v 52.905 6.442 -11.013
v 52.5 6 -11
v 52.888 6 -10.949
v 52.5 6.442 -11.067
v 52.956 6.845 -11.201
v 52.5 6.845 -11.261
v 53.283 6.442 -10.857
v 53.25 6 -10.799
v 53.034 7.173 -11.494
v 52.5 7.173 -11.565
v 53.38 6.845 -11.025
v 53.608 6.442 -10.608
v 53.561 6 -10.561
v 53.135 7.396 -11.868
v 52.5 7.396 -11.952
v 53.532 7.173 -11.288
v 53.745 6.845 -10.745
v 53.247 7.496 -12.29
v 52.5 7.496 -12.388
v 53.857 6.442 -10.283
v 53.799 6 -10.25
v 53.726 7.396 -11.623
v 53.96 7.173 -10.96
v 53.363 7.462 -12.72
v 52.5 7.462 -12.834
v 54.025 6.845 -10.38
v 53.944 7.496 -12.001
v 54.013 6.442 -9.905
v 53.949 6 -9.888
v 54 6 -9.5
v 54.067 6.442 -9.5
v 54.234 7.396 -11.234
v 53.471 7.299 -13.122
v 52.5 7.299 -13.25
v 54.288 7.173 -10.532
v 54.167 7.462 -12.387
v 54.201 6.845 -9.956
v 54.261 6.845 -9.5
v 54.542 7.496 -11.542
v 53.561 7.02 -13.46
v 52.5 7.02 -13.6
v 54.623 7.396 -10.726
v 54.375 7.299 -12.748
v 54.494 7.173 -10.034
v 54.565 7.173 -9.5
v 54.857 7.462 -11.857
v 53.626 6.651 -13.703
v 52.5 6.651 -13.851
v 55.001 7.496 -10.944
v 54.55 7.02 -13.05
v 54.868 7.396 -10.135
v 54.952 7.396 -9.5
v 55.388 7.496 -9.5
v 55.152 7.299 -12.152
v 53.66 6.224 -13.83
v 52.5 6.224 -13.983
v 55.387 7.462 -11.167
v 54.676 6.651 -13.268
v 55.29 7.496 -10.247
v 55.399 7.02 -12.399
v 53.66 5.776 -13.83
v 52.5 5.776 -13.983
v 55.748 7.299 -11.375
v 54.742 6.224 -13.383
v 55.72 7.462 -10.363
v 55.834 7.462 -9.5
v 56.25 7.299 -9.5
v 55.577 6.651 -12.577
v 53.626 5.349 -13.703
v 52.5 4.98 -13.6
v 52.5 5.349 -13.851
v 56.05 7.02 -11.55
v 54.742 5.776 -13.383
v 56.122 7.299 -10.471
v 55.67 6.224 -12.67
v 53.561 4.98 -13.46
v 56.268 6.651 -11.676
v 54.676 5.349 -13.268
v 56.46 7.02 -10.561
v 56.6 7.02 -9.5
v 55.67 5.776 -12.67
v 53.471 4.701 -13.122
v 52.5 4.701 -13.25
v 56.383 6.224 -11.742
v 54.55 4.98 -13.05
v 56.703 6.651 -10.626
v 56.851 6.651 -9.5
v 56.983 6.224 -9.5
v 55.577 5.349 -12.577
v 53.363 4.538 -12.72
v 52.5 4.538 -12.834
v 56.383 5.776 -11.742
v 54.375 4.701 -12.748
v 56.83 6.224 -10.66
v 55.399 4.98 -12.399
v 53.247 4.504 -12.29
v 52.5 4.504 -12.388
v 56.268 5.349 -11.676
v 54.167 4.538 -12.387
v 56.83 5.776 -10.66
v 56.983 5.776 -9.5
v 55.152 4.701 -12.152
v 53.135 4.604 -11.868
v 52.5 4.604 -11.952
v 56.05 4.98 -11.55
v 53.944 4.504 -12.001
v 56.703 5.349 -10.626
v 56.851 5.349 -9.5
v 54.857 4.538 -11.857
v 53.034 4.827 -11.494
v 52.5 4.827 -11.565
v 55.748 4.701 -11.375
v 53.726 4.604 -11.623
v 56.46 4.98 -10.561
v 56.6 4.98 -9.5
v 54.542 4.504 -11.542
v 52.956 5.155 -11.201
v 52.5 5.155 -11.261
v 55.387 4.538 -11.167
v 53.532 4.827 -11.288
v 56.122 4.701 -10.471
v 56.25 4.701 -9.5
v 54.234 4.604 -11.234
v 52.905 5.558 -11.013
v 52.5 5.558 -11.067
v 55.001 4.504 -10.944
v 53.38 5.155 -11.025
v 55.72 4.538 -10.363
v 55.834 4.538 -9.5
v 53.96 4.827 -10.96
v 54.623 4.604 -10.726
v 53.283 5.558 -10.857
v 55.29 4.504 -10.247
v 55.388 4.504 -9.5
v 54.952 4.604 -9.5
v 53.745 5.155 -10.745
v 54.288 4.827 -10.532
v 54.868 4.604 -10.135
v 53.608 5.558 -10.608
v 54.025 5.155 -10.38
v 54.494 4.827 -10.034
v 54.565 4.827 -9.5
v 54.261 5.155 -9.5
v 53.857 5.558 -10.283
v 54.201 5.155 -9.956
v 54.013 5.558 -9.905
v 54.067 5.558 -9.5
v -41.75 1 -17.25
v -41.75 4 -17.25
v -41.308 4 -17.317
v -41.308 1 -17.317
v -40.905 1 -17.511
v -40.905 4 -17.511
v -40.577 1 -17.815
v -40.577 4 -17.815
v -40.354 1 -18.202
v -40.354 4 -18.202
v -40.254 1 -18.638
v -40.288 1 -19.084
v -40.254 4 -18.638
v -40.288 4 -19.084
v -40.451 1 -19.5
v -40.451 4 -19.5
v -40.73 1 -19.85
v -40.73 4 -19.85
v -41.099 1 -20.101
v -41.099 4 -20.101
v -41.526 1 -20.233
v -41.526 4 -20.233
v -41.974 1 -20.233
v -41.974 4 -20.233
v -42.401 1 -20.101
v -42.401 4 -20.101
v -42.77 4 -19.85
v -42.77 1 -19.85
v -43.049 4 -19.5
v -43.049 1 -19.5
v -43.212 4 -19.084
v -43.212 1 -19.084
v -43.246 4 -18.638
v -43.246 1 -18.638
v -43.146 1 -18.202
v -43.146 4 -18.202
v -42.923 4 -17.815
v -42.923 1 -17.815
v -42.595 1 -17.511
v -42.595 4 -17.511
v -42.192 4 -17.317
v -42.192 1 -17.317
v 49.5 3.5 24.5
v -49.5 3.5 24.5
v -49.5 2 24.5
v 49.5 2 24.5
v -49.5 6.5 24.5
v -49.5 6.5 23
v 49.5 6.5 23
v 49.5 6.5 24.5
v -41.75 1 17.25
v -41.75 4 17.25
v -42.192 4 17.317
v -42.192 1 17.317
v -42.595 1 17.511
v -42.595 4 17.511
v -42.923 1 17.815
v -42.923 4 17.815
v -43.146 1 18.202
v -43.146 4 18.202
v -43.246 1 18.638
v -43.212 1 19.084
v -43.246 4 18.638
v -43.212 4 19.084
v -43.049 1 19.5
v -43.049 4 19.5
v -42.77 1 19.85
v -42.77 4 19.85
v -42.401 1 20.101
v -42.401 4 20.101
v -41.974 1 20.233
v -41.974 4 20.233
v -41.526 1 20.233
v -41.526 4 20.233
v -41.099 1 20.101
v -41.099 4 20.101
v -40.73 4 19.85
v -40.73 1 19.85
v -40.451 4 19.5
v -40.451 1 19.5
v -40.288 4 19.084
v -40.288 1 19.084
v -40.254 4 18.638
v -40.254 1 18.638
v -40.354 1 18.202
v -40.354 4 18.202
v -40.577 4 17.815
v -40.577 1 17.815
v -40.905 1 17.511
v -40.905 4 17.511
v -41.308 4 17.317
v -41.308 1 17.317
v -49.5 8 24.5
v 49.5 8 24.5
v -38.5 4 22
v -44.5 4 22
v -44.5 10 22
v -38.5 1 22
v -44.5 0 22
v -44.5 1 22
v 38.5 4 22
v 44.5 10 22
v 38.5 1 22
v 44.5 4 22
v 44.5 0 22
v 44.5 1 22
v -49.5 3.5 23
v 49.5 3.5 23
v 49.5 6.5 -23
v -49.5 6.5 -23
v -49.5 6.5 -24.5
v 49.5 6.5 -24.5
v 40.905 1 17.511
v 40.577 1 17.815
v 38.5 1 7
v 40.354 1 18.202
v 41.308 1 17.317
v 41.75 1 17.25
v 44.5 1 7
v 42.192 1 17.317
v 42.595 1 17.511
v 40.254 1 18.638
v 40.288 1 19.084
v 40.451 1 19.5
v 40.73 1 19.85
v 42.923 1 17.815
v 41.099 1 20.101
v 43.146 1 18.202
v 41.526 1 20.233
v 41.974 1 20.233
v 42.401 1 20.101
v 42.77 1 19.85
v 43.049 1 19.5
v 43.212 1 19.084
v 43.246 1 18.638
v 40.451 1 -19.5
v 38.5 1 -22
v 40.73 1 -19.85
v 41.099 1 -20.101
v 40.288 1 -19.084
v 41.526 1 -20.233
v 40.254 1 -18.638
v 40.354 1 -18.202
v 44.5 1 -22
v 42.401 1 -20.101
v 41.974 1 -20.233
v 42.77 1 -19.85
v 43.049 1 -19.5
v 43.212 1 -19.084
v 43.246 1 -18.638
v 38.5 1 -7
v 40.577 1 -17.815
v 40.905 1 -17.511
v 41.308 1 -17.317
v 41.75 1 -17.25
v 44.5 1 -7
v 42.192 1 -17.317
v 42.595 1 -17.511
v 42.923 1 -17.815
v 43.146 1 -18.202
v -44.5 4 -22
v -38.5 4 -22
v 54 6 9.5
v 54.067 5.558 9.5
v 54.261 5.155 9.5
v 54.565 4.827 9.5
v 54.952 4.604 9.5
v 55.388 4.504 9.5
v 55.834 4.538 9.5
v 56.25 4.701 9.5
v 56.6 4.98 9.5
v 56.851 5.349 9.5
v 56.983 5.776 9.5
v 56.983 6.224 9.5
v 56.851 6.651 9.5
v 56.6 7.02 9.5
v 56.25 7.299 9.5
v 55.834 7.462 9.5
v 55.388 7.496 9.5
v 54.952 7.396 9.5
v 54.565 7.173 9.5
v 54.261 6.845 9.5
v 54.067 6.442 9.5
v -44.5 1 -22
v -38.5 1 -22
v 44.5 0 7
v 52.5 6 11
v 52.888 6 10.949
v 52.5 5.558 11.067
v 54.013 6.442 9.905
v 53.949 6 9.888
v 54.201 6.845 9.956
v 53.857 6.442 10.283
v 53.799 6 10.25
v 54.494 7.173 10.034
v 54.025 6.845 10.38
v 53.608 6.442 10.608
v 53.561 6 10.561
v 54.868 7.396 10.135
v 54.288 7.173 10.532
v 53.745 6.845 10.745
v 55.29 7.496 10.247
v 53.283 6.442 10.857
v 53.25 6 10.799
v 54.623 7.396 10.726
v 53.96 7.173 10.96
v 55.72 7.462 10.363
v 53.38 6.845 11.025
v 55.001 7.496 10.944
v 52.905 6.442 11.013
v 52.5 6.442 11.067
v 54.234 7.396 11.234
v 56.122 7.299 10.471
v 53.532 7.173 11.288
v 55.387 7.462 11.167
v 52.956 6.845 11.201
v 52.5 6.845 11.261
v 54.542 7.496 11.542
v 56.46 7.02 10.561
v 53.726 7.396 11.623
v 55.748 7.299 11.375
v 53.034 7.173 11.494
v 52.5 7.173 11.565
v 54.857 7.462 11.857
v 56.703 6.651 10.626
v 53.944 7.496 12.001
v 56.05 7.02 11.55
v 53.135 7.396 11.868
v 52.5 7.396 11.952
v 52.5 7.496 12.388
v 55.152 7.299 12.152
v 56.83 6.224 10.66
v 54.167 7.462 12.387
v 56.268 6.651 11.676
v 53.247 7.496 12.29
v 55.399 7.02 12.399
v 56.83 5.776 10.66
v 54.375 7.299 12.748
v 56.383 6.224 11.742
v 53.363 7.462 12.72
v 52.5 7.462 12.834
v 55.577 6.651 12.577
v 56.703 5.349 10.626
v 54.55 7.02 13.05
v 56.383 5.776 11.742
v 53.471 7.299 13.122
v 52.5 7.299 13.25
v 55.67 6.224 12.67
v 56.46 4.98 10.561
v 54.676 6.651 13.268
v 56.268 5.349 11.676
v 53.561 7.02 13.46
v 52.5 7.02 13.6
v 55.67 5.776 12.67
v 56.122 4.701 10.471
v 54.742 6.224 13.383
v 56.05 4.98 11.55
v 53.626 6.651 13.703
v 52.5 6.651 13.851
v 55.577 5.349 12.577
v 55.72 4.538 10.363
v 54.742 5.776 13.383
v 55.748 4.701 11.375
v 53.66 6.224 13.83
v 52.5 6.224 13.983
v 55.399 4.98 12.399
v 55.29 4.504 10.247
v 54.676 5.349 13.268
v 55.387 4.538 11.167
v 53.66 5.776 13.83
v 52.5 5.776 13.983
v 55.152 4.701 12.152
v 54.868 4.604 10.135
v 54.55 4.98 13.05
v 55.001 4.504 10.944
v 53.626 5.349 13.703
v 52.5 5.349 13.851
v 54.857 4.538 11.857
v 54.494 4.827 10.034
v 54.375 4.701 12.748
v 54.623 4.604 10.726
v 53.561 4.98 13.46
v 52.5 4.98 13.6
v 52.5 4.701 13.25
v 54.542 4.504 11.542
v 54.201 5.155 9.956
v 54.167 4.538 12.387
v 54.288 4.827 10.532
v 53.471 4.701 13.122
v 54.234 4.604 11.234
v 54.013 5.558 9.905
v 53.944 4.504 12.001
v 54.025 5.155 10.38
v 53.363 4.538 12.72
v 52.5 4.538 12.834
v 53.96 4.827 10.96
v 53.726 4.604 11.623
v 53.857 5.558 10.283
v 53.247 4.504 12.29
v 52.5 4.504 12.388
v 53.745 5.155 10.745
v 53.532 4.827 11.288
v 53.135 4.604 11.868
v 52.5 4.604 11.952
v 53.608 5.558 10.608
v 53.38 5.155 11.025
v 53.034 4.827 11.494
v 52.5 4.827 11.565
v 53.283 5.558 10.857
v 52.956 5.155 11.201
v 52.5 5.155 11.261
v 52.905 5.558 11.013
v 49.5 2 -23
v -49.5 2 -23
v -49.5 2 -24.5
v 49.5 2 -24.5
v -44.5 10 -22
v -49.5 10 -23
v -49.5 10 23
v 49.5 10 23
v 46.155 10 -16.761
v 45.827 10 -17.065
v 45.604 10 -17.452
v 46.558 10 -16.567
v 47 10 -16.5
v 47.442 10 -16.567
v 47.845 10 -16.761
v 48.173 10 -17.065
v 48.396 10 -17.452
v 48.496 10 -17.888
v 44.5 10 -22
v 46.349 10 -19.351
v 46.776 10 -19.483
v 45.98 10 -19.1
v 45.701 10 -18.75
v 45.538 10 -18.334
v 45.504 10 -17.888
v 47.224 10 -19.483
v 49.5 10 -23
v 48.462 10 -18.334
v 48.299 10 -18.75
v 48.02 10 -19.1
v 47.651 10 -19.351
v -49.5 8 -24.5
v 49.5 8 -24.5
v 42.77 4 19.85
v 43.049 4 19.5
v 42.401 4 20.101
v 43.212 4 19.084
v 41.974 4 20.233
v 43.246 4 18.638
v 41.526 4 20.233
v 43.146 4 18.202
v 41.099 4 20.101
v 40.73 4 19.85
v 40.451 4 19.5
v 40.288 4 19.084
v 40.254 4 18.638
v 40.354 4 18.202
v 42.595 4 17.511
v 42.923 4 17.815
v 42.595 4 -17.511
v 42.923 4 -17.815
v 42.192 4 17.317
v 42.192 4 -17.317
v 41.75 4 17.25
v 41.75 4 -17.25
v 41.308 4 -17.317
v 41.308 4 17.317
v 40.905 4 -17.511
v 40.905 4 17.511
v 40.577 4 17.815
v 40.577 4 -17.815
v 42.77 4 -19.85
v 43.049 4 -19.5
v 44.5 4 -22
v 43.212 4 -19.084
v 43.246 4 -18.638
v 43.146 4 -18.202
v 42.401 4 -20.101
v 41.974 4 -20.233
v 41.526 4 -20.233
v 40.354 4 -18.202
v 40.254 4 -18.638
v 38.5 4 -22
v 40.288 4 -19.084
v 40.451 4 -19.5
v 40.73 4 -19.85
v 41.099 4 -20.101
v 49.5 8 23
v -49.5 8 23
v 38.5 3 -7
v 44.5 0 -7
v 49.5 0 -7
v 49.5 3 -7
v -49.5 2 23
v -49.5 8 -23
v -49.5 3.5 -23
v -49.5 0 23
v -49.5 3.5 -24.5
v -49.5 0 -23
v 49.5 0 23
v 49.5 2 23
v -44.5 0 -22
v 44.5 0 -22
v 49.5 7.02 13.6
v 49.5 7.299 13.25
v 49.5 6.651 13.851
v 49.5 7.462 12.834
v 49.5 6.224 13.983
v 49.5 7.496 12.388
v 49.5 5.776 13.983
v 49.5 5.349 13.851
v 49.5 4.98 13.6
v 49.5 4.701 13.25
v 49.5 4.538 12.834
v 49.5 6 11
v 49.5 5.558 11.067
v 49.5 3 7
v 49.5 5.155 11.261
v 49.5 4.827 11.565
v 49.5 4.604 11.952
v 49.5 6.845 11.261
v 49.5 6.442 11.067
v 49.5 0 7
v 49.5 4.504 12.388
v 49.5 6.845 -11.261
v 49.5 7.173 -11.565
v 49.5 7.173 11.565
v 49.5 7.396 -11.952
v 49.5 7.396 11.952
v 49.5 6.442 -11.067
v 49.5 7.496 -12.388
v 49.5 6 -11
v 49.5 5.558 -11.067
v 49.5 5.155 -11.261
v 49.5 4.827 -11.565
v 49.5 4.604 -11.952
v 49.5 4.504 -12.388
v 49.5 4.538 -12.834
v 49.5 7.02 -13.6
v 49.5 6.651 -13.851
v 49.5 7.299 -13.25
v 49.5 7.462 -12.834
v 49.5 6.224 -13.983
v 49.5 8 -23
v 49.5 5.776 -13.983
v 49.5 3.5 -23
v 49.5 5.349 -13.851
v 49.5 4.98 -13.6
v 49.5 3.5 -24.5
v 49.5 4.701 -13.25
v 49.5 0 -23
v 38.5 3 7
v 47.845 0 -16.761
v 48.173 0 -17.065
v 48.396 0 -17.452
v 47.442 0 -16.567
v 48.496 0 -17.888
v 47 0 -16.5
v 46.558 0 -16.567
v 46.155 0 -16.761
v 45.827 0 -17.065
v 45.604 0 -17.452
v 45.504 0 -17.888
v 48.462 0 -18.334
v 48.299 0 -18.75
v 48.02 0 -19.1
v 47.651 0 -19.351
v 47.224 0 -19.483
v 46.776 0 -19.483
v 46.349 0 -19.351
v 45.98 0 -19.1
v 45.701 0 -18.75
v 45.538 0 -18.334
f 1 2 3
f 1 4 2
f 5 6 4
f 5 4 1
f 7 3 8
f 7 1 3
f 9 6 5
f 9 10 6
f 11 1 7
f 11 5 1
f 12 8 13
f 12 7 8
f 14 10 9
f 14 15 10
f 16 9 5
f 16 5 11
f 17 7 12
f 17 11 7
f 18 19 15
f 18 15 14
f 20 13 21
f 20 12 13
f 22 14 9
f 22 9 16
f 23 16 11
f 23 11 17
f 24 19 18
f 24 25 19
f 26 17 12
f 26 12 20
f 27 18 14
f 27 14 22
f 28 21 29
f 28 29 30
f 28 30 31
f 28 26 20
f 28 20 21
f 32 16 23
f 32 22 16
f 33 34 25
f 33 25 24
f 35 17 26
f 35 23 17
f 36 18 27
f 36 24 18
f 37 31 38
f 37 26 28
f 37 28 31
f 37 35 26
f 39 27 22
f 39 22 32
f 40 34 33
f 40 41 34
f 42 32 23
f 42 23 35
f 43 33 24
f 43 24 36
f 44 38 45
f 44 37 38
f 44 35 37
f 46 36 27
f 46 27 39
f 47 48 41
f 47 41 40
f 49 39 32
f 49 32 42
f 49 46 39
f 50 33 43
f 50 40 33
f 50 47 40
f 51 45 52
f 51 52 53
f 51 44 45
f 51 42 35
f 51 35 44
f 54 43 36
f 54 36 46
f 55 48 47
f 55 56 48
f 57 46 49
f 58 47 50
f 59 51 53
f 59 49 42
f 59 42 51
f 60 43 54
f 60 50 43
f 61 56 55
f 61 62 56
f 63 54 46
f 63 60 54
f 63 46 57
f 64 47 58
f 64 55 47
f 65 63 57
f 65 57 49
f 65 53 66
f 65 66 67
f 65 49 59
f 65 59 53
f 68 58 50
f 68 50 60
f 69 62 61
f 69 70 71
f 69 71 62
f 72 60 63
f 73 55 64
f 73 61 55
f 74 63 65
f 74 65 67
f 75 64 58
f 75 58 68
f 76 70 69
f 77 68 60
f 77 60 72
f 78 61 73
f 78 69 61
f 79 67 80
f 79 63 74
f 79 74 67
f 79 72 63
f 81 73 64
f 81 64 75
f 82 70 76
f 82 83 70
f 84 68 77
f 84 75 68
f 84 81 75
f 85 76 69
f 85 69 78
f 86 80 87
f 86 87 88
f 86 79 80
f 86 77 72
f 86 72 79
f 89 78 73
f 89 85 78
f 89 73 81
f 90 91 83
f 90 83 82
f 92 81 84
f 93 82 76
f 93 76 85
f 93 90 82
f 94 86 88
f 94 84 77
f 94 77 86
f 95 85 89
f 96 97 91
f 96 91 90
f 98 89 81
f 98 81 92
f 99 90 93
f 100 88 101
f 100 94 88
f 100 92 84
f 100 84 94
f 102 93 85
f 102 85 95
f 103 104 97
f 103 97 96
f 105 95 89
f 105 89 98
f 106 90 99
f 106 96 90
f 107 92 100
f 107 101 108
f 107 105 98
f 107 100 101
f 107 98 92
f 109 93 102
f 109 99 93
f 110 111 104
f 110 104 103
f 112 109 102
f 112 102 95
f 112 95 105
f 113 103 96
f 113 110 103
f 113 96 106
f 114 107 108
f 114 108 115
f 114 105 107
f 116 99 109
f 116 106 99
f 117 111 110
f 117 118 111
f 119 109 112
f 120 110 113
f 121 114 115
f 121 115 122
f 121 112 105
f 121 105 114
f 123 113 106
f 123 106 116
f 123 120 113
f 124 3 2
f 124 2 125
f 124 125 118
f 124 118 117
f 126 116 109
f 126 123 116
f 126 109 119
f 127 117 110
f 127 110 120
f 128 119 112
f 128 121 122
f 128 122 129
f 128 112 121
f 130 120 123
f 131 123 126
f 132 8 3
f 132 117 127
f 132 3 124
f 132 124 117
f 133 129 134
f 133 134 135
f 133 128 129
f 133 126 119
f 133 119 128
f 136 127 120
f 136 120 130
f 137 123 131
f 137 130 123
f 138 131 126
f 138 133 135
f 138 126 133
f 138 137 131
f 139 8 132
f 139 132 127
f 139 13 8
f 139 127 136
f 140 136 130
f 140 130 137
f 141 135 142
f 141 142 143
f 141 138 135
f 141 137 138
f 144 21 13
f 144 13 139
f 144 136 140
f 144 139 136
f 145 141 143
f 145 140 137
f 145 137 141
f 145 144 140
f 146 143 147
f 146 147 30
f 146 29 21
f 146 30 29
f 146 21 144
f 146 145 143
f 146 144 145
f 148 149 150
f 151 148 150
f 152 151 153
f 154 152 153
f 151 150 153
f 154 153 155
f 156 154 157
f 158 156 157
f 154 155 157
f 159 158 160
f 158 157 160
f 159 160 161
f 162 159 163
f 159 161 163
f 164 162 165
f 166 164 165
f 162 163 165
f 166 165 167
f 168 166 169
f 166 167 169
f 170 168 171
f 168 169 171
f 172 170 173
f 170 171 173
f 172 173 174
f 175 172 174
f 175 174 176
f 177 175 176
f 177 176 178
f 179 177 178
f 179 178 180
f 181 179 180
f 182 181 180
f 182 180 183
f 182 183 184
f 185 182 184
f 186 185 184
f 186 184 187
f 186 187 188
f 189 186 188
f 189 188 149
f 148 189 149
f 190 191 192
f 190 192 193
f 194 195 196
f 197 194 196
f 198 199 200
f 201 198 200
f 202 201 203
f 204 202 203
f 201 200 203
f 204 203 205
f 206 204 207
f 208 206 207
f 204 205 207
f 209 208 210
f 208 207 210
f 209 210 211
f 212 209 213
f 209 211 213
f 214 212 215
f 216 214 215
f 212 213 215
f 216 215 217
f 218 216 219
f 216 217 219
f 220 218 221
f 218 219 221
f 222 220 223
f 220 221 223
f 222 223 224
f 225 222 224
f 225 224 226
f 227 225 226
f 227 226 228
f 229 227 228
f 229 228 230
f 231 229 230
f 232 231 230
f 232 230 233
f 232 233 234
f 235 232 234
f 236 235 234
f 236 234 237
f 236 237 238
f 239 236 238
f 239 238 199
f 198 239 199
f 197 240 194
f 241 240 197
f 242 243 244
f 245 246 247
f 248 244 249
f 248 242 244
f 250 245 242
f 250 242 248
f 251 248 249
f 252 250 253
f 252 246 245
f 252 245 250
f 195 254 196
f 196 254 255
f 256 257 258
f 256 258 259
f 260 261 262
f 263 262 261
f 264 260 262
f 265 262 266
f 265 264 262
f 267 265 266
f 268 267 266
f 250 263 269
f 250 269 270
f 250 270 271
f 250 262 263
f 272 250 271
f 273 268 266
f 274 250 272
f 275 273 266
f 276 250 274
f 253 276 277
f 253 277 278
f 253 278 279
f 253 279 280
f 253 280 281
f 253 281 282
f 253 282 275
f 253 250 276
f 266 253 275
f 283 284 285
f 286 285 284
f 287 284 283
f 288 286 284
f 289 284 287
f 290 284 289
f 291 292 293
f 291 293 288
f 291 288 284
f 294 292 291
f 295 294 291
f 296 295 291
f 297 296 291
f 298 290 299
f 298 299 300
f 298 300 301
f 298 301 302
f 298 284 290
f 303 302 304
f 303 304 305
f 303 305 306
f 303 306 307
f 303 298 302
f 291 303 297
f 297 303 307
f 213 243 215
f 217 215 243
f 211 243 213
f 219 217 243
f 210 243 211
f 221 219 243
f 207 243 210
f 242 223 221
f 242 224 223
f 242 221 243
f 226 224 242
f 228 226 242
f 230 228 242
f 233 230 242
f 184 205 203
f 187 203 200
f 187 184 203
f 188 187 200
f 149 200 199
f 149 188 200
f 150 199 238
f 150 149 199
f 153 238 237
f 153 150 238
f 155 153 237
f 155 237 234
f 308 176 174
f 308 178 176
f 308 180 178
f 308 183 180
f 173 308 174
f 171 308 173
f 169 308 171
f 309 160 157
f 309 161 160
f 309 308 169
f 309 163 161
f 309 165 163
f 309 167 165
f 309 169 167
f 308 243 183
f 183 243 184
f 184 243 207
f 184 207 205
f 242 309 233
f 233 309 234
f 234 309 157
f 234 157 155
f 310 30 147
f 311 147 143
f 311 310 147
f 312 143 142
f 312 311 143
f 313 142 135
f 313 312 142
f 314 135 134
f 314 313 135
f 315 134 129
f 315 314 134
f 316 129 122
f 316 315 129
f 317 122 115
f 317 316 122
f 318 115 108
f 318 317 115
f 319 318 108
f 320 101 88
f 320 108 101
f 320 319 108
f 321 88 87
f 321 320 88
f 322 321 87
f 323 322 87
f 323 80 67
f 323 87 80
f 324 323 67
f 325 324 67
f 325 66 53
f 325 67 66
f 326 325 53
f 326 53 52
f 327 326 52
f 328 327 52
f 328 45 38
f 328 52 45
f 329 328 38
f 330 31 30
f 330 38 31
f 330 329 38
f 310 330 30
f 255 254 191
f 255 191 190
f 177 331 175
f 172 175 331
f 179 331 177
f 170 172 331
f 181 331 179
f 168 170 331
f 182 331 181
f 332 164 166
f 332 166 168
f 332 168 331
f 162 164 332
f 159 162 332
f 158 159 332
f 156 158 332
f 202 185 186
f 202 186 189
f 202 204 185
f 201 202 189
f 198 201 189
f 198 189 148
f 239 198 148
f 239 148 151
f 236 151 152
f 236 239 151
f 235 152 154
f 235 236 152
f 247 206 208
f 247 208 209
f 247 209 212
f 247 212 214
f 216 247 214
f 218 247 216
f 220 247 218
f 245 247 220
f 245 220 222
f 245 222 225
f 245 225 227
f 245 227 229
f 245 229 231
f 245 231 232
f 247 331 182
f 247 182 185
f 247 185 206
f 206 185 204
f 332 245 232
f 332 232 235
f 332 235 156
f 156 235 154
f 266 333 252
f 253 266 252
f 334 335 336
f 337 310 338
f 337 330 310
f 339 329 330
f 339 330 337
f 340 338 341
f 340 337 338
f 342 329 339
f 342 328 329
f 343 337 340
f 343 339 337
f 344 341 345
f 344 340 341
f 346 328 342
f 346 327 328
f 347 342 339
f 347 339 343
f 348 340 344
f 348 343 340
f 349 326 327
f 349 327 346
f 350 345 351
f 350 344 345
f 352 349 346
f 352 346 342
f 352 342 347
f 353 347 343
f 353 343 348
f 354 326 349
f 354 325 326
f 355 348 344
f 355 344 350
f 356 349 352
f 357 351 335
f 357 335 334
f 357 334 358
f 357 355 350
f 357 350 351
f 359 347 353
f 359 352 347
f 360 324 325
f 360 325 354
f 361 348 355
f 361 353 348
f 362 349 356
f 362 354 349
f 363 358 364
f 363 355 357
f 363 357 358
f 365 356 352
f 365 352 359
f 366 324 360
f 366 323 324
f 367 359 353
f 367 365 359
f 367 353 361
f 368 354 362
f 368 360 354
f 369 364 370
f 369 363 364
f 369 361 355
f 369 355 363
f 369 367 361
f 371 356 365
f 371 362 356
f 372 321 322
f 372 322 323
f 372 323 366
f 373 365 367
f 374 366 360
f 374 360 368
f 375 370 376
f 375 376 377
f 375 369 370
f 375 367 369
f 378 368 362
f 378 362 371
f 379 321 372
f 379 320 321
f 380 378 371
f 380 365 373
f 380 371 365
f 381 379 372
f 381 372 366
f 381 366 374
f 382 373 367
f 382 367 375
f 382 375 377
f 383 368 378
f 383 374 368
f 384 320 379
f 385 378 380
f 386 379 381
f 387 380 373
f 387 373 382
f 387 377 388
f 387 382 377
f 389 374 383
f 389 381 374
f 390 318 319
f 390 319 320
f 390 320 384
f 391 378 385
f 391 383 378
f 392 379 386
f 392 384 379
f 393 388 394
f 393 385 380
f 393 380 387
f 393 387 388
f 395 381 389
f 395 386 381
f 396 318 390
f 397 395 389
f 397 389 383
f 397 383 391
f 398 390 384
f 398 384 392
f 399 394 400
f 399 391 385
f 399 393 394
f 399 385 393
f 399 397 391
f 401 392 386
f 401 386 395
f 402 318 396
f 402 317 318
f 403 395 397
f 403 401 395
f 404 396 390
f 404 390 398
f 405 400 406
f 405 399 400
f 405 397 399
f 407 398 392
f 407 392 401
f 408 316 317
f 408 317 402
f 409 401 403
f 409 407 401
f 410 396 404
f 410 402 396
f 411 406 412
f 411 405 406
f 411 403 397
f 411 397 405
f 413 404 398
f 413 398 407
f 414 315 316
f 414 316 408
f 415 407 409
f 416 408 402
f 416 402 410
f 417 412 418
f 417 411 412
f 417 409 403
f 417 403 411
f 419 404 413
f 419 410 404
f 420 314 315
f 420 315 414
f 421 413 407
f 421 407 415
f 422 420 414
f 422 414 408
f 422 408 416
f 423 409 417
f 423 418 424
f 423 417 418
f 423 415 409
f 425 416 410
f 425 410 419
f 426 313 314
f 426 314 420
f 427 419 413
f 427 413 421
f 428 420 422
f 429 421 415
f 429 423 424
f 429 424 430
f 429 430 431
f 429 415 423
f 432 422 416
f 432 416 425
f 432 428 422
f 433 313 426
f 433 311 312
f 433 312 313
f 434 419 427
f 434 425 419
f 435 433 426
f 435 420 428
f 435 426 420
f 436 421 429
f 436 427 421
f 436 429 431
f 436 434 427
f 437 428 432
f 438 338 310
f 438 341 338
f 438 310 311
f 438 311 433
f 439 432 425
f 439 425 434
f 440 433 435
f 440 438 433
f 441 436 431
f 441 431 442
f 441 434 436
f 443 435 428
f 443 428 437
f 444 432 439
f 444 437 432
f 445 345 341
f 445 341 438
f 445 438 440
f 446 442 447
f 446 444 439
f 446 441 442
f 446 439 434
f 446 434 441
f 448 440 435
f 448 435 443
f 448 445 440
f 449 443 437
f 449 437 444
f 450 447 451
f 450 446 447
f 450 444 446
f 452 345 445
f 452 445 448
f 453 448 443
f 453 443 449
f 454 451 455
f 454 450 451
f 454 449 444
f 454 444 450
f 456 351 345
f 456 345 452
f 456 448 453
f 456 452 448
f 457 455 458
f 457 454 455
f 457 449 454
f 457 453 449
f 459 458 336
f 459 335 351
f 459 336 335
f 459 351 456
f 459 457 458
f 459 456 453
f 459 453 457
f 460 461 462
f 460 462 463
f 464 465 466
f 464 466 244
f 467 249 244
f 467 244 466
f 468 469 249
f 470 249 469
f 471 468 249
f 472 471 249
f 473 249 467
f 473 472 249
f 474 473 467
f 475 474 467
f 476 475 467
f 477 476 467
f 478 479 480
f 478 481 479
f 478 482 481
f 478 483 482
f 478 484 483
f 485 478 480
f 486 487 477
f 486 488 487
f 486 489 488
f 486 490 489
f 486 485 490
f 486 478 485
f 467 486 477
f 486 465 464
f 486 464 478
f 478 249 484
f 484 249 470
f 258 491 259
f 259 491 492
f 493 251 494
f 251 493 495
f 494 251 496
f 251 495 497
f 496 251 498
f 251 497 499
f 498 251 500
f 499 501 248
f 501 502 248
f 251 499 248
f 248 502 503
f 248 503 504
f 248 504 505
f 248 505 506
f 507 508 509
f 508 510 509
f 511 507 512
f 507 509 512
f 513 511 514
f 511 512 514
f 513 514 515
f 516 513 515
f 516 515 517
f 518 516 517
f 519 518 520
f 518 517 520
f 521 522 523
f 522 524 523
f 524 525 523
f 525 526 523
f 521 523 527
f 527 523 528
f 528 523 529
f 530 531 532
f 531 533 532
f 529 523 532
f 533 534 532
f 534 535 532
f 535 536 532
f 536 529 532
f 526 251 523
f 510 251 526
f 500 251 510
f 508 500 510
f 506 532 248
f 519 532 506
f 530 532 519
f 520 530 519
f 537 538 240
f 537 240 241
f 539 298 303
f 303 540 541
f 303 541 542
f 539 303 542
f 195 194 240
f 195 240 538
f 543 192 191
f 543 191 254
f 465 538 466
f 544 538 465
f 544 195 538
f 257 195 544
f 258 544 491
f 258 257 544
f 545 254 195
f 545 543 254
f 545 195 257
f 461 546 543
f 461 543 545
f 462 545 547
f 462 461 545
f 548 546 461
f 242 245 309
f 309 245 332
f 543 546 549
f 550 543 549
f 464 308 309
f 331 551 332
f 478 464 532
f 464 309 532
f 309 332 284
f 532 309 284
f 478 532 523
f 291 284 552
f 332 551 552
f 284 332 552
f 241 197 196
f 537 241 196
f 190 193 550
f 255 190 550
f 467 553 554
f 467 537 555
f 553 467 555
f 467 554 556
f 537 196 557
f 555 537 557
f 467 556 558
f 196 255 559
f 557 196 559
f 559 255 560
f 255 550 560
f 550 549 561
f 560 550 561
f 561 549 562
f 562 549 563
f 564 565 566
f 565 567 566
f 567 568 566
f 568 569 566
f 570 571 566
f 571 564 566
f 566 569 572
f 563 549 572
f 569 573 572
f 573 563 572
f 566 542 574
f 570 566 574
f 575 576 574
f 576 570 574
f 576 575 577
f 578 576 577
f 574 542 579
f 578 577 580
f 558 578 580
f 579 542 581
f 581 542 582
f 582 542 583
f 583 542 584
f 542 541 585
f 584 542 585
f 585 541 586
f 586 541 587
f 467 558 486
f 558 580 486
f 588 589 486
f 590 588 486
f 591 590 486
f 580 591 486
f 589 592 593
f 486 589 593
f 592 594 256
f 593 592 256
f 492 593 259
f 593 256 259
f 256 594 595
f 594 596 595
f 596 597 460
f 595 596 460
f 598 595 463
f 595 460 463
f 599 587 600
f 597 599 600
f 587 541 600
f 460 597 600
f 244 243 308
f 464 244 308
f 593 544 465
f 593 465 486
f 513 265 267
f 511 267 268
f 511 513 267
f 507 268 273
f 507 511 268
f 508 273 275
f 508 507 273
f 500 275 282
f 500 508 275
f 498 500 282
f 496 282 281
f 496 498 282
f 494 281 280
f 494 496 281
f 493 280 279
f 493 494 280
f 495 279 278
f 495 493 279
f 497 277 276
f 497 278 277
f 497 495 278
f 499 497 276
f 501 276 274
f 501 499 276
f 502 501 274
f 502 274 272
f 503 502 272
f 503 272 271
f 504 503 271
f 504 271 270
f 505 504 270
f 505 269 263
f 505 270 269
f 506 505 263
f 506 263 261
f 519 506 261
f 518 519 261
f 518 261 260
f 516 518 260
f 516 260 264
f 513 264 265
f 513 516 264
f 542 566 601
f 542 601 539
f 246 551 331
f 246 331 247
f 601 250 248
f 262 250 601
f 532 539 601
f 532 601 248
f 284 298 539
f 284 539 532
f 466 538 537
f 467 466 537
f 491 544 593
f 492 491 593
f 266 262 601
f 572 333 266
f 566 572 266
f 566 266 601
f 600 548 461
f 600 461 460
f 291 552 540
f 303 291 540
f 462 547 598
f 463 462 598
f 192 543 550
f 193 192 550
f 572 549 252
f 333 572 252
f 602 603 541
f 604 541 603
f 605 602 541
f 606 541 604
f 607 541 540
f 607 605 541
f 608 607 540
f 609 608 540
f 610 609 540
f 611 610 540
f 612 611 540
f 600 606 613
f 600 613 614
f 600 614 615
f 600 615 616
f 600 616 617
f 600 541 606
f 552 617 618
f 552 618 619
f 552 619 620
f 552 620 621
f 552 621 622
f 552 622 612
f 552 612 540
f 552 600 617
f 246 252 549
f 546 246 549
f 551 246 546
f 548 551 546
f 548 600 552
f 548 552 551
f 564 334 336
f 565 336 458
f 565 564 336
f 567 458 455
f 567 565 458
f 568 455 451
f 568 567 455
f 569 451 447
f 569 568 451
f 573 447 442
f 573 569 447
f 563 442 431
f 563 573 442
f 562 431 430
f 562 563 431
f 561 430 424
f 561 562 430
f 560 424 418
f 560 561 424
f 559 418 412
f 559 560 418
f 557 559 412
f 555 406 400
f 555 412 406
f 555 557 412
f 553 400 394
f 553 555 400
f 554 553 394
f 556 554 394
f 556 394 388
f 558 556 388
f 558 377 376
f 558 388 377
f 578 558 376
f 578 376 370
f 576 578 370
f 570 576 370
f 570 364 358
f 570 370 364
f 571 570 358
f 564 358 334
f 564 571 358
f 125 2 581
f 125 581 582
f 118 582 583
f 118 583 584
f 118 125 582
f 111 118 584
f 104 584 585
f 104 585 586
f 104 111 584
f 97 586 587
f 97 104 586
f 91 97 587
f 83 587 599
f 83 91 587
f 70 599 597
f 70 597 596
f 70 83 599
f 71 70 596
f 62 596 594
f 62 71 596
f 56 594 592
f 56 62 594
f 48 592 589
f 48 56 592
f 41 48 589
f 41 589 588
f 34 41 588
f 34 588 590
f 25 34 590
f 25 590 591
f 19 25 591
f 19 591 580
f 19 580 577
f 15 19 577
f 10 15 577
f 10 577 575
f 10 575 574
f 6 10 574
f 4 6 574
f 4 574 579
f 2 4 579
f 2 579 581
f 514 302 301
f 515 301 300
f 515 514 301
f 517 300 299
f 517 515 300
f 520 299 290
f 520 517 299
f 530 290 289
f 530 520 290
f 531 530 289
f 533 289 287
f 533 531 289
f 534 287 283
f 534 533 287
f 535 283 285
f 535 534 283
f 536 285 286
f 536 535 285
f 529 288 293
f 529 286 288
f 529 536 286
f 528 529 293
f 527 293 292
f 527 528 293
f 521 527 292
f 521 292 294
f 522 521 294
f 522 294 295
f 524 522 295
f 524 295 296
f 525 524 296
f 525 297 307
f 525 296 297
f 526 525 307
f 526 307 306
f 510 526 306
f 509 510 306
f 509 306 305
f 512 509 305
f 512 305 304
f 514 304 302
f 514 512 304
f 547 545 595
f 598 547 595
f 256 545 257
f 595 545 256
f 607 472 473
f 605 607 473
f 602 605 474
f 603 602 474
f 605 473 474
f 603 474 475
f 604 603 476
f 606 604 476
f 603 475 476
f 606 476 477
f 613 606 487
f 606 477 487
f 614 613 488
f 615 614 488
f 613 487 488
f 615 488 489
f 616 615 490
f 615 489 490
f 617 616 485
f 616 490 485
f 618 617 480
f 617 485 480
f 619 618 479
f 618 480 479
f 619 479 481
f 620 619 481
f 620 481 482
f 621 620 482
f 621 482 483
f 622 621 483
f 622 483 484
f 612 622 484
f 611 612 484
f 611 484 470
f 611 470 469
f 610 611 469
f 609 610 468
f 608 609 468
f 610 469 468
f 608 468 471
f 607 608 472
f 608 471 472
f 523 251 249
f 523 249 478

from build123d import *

# Parameters (mm, degrees)
SKETCH1_W           = 99
SKETCH1_H           = 46
SKETCH1_W_2         = 89
SKETCH1_H_2         = 44
BOSS_EXTRUDE1_DEPTH = 10
SKETCH2_W           = 99
SKETCH2_H           = 1.5
BOSS_EXTRUDE2_DEPTH = 1.5
SKETCH4_W           = 6
SKETCH4_H           = 44
BOSS_EXTRUDE3_DEPTH = 4
SKETCH5_R           = 1.5
CUT_EXTRUDE1_DEPTH  = 4
SKETCH6_W           = 6
SKETCH6_H           = 44
CUT_EXTRUDE2_DEPTH  = 1
CUT_EXTRUDE3_REACH  = 104.476
SKETCH7_W           = 14
SKETCH7_H           = 3
SWEEP3_PROFILE_R    = 1.5
SKETCH23_R          = 1.5
CUT_EXTRUDE4_DEPTH  = 10


with BuildPart() as part:
    # Sketch1 → Boss-Extrude1 (new body)
    with BuildSketch(Plane(origin=(0, 0, 0), x_dir=(1, 0, 0), z_dir=(0, 1, 0))):
        Rectangle(SKETCH1_W, SKETCH1_H)
        Rectangle(SKETCH1_W_2, SKETCH1_H_2, mode=Mode.SUBTRACT)
    extrude(amount=BOSS_EXTRUDE1_DEPTH)

    # Sketch2 → Boss-Extrude2 (add)
    with BuildSketch(Plane.XY.offset(23)):
        with Locations((0, 2.75)):
            Rectangle(SKETCH2_W, SKETCH2_H)
        with Locations((0, 7.25)):
            Rectangle(SKETCH2_W, SKETCH2_H)
    boss_extrude2 = extrude(amount=BOSS_EXTRUDE2_DEPTH)

    # Mirror1: Boss-Extrude2 across plane
    add(boss_extrude2.mirror(Plane.XY))

    # Sketch4 → Boss-Extrude3 (add)
    with BuildSketch(Plane(origin=(0, 0, 0), x_dir=(1, 0, 0), z_dir=(0, 1, 0))):
        with Locations((-41.5, 0)):
            Rectangle(SKETCH4_W, SKETCH4_H)
    boss_extrude3 = extrude(amount=BOSS_EXTRUDE3_DEPTH)

    # Mirror2: Boss-Extrude3 across plane
    add(boss_extrude3.mirror(Plane(origin=(0, 0, 0), x_dir=(0, 0, 1), z_dir=(1, 0, 0))))

    # Sketch5 → Cut-Extrude1 (cut)
    with BuildSketch(Plane(origin=(0, 4, 0), x_dir=(1, 0, 0), z_dir=(0, 1, 0))):
        with Locations(Location((-41.75, 18.75, 0), (0, 0, 270))):
            Circle(SKETCH5_R)
        with Locations(Location((-41.75, -18.75, 0), (0, 0, 90))):
            Circle(SKETCH5_R)
    cut_extrude1 = extrude(amount=-CUT_EXTRUDE1_DEPTH, mode=Mode.SUBTRACT)

    # Mirror3: Cut-Extrude1 across plane
    add(cut_extrude1.mirror(Plane(origin=(0, 0, 0), x_dir=(0, 0, 1), z_dir=(1, 0, 0))), mode=Mode.SUBTRACT)

    # Sketch6 → Cut-Extrude2 (cut)
    with BuildSketch(Plane.XZ):
        with Locations((-41.5, 0)):
            Rectangle(SKETCH6_W, SKETCH6_H)
        with Locations((41.5, 0)):
            Rectangle(SKETCH6_W, SKETCH6_H)
    extrude(amount=-CUT_EXTRUDE2_DEPTH, mode=Mode.SUBTRACT)

    # Cut-Extrude3: up to this face of the body (flat: up to its plane)
    cut_extrude3_end = Plane(part.part.faces().sort_by_distance((38.5, 2.5, 0))[0])
    # Sketch7 → Cut-Extrude3 (cut, up to the picked face)
    with BuildSketch(Plane(origin=(49.5, 0, 0), x_dir=(0, 0, -1), z_dir=(1, 0, 0)), mode=Mode.PRIVATE) as cut_extrude3_sk1:
        with Locations((0, 1.5)):
            Rectangle(SKETCH7_W, SKETCH7_H)
    cut_extrude3_tool1 = split(extrude(cut_extrude3_sk1.sketch, amount=-CUT_EXTRUDE3_REACH, mode=Mode.PRIVATE), bisect_by=cut_extrude3_end, keep=Keep.BOTH, mode=Mode.PRIVATE)
    add(cut_extrude3_tool1.solids().sort_by(Axis((49.5, 1.5, 0), (-1, 0, 0)))[0], mode=Mode.SUBTRACT)

    # Sweep3: sweep along a path in Sketch9
    with BuildLine(Plane(origin=(0, 6, 0), x_dir=(1, 0, 0), z_dir=(0, 1, 0))) as sweep3_path:
        Line((49.5, 12.5), (52.5, 12.5))
        ThreePointArc((52.5, 12.5), (54.621320344, 11.621320344), (55.5, 9.5))
        Line((55.5, 9.5), (55.5, -9.5))
        ThreePointArc((55.5, -9.5), (54.621320344, -11.621320344), (52.5, -12.5))
        Line((52.5, -12.5), (49.5, -12.5))
    # Sweep3 profile (on start of the path) → Sweep3 (sweep)
    with BuildSketch(Plane(origin=(49.5, 6, -12.5), x_dir=(0, 0, 1), z_dir=(1, 0, 0))):
        Circle(SWEEP3_PROFILE_R)
    sweep(path=sweep3_path.line)

    # Sketch23 → Cut-Extrude4 (cut)
    with BuildSketch(Plane(origin=(0, 10, 0), x_dir=(1, 0, 0), z_dir=(0, 1, 0))):
        with Locations(Location((47, 18, 0), (0, 0, 270))):
            Circle(SKETCH23_R)
    extrude(amount=-CUT_EXTRUDE4_DEPTH, mode=Mode.SUBTRACT)


solid = part.part
